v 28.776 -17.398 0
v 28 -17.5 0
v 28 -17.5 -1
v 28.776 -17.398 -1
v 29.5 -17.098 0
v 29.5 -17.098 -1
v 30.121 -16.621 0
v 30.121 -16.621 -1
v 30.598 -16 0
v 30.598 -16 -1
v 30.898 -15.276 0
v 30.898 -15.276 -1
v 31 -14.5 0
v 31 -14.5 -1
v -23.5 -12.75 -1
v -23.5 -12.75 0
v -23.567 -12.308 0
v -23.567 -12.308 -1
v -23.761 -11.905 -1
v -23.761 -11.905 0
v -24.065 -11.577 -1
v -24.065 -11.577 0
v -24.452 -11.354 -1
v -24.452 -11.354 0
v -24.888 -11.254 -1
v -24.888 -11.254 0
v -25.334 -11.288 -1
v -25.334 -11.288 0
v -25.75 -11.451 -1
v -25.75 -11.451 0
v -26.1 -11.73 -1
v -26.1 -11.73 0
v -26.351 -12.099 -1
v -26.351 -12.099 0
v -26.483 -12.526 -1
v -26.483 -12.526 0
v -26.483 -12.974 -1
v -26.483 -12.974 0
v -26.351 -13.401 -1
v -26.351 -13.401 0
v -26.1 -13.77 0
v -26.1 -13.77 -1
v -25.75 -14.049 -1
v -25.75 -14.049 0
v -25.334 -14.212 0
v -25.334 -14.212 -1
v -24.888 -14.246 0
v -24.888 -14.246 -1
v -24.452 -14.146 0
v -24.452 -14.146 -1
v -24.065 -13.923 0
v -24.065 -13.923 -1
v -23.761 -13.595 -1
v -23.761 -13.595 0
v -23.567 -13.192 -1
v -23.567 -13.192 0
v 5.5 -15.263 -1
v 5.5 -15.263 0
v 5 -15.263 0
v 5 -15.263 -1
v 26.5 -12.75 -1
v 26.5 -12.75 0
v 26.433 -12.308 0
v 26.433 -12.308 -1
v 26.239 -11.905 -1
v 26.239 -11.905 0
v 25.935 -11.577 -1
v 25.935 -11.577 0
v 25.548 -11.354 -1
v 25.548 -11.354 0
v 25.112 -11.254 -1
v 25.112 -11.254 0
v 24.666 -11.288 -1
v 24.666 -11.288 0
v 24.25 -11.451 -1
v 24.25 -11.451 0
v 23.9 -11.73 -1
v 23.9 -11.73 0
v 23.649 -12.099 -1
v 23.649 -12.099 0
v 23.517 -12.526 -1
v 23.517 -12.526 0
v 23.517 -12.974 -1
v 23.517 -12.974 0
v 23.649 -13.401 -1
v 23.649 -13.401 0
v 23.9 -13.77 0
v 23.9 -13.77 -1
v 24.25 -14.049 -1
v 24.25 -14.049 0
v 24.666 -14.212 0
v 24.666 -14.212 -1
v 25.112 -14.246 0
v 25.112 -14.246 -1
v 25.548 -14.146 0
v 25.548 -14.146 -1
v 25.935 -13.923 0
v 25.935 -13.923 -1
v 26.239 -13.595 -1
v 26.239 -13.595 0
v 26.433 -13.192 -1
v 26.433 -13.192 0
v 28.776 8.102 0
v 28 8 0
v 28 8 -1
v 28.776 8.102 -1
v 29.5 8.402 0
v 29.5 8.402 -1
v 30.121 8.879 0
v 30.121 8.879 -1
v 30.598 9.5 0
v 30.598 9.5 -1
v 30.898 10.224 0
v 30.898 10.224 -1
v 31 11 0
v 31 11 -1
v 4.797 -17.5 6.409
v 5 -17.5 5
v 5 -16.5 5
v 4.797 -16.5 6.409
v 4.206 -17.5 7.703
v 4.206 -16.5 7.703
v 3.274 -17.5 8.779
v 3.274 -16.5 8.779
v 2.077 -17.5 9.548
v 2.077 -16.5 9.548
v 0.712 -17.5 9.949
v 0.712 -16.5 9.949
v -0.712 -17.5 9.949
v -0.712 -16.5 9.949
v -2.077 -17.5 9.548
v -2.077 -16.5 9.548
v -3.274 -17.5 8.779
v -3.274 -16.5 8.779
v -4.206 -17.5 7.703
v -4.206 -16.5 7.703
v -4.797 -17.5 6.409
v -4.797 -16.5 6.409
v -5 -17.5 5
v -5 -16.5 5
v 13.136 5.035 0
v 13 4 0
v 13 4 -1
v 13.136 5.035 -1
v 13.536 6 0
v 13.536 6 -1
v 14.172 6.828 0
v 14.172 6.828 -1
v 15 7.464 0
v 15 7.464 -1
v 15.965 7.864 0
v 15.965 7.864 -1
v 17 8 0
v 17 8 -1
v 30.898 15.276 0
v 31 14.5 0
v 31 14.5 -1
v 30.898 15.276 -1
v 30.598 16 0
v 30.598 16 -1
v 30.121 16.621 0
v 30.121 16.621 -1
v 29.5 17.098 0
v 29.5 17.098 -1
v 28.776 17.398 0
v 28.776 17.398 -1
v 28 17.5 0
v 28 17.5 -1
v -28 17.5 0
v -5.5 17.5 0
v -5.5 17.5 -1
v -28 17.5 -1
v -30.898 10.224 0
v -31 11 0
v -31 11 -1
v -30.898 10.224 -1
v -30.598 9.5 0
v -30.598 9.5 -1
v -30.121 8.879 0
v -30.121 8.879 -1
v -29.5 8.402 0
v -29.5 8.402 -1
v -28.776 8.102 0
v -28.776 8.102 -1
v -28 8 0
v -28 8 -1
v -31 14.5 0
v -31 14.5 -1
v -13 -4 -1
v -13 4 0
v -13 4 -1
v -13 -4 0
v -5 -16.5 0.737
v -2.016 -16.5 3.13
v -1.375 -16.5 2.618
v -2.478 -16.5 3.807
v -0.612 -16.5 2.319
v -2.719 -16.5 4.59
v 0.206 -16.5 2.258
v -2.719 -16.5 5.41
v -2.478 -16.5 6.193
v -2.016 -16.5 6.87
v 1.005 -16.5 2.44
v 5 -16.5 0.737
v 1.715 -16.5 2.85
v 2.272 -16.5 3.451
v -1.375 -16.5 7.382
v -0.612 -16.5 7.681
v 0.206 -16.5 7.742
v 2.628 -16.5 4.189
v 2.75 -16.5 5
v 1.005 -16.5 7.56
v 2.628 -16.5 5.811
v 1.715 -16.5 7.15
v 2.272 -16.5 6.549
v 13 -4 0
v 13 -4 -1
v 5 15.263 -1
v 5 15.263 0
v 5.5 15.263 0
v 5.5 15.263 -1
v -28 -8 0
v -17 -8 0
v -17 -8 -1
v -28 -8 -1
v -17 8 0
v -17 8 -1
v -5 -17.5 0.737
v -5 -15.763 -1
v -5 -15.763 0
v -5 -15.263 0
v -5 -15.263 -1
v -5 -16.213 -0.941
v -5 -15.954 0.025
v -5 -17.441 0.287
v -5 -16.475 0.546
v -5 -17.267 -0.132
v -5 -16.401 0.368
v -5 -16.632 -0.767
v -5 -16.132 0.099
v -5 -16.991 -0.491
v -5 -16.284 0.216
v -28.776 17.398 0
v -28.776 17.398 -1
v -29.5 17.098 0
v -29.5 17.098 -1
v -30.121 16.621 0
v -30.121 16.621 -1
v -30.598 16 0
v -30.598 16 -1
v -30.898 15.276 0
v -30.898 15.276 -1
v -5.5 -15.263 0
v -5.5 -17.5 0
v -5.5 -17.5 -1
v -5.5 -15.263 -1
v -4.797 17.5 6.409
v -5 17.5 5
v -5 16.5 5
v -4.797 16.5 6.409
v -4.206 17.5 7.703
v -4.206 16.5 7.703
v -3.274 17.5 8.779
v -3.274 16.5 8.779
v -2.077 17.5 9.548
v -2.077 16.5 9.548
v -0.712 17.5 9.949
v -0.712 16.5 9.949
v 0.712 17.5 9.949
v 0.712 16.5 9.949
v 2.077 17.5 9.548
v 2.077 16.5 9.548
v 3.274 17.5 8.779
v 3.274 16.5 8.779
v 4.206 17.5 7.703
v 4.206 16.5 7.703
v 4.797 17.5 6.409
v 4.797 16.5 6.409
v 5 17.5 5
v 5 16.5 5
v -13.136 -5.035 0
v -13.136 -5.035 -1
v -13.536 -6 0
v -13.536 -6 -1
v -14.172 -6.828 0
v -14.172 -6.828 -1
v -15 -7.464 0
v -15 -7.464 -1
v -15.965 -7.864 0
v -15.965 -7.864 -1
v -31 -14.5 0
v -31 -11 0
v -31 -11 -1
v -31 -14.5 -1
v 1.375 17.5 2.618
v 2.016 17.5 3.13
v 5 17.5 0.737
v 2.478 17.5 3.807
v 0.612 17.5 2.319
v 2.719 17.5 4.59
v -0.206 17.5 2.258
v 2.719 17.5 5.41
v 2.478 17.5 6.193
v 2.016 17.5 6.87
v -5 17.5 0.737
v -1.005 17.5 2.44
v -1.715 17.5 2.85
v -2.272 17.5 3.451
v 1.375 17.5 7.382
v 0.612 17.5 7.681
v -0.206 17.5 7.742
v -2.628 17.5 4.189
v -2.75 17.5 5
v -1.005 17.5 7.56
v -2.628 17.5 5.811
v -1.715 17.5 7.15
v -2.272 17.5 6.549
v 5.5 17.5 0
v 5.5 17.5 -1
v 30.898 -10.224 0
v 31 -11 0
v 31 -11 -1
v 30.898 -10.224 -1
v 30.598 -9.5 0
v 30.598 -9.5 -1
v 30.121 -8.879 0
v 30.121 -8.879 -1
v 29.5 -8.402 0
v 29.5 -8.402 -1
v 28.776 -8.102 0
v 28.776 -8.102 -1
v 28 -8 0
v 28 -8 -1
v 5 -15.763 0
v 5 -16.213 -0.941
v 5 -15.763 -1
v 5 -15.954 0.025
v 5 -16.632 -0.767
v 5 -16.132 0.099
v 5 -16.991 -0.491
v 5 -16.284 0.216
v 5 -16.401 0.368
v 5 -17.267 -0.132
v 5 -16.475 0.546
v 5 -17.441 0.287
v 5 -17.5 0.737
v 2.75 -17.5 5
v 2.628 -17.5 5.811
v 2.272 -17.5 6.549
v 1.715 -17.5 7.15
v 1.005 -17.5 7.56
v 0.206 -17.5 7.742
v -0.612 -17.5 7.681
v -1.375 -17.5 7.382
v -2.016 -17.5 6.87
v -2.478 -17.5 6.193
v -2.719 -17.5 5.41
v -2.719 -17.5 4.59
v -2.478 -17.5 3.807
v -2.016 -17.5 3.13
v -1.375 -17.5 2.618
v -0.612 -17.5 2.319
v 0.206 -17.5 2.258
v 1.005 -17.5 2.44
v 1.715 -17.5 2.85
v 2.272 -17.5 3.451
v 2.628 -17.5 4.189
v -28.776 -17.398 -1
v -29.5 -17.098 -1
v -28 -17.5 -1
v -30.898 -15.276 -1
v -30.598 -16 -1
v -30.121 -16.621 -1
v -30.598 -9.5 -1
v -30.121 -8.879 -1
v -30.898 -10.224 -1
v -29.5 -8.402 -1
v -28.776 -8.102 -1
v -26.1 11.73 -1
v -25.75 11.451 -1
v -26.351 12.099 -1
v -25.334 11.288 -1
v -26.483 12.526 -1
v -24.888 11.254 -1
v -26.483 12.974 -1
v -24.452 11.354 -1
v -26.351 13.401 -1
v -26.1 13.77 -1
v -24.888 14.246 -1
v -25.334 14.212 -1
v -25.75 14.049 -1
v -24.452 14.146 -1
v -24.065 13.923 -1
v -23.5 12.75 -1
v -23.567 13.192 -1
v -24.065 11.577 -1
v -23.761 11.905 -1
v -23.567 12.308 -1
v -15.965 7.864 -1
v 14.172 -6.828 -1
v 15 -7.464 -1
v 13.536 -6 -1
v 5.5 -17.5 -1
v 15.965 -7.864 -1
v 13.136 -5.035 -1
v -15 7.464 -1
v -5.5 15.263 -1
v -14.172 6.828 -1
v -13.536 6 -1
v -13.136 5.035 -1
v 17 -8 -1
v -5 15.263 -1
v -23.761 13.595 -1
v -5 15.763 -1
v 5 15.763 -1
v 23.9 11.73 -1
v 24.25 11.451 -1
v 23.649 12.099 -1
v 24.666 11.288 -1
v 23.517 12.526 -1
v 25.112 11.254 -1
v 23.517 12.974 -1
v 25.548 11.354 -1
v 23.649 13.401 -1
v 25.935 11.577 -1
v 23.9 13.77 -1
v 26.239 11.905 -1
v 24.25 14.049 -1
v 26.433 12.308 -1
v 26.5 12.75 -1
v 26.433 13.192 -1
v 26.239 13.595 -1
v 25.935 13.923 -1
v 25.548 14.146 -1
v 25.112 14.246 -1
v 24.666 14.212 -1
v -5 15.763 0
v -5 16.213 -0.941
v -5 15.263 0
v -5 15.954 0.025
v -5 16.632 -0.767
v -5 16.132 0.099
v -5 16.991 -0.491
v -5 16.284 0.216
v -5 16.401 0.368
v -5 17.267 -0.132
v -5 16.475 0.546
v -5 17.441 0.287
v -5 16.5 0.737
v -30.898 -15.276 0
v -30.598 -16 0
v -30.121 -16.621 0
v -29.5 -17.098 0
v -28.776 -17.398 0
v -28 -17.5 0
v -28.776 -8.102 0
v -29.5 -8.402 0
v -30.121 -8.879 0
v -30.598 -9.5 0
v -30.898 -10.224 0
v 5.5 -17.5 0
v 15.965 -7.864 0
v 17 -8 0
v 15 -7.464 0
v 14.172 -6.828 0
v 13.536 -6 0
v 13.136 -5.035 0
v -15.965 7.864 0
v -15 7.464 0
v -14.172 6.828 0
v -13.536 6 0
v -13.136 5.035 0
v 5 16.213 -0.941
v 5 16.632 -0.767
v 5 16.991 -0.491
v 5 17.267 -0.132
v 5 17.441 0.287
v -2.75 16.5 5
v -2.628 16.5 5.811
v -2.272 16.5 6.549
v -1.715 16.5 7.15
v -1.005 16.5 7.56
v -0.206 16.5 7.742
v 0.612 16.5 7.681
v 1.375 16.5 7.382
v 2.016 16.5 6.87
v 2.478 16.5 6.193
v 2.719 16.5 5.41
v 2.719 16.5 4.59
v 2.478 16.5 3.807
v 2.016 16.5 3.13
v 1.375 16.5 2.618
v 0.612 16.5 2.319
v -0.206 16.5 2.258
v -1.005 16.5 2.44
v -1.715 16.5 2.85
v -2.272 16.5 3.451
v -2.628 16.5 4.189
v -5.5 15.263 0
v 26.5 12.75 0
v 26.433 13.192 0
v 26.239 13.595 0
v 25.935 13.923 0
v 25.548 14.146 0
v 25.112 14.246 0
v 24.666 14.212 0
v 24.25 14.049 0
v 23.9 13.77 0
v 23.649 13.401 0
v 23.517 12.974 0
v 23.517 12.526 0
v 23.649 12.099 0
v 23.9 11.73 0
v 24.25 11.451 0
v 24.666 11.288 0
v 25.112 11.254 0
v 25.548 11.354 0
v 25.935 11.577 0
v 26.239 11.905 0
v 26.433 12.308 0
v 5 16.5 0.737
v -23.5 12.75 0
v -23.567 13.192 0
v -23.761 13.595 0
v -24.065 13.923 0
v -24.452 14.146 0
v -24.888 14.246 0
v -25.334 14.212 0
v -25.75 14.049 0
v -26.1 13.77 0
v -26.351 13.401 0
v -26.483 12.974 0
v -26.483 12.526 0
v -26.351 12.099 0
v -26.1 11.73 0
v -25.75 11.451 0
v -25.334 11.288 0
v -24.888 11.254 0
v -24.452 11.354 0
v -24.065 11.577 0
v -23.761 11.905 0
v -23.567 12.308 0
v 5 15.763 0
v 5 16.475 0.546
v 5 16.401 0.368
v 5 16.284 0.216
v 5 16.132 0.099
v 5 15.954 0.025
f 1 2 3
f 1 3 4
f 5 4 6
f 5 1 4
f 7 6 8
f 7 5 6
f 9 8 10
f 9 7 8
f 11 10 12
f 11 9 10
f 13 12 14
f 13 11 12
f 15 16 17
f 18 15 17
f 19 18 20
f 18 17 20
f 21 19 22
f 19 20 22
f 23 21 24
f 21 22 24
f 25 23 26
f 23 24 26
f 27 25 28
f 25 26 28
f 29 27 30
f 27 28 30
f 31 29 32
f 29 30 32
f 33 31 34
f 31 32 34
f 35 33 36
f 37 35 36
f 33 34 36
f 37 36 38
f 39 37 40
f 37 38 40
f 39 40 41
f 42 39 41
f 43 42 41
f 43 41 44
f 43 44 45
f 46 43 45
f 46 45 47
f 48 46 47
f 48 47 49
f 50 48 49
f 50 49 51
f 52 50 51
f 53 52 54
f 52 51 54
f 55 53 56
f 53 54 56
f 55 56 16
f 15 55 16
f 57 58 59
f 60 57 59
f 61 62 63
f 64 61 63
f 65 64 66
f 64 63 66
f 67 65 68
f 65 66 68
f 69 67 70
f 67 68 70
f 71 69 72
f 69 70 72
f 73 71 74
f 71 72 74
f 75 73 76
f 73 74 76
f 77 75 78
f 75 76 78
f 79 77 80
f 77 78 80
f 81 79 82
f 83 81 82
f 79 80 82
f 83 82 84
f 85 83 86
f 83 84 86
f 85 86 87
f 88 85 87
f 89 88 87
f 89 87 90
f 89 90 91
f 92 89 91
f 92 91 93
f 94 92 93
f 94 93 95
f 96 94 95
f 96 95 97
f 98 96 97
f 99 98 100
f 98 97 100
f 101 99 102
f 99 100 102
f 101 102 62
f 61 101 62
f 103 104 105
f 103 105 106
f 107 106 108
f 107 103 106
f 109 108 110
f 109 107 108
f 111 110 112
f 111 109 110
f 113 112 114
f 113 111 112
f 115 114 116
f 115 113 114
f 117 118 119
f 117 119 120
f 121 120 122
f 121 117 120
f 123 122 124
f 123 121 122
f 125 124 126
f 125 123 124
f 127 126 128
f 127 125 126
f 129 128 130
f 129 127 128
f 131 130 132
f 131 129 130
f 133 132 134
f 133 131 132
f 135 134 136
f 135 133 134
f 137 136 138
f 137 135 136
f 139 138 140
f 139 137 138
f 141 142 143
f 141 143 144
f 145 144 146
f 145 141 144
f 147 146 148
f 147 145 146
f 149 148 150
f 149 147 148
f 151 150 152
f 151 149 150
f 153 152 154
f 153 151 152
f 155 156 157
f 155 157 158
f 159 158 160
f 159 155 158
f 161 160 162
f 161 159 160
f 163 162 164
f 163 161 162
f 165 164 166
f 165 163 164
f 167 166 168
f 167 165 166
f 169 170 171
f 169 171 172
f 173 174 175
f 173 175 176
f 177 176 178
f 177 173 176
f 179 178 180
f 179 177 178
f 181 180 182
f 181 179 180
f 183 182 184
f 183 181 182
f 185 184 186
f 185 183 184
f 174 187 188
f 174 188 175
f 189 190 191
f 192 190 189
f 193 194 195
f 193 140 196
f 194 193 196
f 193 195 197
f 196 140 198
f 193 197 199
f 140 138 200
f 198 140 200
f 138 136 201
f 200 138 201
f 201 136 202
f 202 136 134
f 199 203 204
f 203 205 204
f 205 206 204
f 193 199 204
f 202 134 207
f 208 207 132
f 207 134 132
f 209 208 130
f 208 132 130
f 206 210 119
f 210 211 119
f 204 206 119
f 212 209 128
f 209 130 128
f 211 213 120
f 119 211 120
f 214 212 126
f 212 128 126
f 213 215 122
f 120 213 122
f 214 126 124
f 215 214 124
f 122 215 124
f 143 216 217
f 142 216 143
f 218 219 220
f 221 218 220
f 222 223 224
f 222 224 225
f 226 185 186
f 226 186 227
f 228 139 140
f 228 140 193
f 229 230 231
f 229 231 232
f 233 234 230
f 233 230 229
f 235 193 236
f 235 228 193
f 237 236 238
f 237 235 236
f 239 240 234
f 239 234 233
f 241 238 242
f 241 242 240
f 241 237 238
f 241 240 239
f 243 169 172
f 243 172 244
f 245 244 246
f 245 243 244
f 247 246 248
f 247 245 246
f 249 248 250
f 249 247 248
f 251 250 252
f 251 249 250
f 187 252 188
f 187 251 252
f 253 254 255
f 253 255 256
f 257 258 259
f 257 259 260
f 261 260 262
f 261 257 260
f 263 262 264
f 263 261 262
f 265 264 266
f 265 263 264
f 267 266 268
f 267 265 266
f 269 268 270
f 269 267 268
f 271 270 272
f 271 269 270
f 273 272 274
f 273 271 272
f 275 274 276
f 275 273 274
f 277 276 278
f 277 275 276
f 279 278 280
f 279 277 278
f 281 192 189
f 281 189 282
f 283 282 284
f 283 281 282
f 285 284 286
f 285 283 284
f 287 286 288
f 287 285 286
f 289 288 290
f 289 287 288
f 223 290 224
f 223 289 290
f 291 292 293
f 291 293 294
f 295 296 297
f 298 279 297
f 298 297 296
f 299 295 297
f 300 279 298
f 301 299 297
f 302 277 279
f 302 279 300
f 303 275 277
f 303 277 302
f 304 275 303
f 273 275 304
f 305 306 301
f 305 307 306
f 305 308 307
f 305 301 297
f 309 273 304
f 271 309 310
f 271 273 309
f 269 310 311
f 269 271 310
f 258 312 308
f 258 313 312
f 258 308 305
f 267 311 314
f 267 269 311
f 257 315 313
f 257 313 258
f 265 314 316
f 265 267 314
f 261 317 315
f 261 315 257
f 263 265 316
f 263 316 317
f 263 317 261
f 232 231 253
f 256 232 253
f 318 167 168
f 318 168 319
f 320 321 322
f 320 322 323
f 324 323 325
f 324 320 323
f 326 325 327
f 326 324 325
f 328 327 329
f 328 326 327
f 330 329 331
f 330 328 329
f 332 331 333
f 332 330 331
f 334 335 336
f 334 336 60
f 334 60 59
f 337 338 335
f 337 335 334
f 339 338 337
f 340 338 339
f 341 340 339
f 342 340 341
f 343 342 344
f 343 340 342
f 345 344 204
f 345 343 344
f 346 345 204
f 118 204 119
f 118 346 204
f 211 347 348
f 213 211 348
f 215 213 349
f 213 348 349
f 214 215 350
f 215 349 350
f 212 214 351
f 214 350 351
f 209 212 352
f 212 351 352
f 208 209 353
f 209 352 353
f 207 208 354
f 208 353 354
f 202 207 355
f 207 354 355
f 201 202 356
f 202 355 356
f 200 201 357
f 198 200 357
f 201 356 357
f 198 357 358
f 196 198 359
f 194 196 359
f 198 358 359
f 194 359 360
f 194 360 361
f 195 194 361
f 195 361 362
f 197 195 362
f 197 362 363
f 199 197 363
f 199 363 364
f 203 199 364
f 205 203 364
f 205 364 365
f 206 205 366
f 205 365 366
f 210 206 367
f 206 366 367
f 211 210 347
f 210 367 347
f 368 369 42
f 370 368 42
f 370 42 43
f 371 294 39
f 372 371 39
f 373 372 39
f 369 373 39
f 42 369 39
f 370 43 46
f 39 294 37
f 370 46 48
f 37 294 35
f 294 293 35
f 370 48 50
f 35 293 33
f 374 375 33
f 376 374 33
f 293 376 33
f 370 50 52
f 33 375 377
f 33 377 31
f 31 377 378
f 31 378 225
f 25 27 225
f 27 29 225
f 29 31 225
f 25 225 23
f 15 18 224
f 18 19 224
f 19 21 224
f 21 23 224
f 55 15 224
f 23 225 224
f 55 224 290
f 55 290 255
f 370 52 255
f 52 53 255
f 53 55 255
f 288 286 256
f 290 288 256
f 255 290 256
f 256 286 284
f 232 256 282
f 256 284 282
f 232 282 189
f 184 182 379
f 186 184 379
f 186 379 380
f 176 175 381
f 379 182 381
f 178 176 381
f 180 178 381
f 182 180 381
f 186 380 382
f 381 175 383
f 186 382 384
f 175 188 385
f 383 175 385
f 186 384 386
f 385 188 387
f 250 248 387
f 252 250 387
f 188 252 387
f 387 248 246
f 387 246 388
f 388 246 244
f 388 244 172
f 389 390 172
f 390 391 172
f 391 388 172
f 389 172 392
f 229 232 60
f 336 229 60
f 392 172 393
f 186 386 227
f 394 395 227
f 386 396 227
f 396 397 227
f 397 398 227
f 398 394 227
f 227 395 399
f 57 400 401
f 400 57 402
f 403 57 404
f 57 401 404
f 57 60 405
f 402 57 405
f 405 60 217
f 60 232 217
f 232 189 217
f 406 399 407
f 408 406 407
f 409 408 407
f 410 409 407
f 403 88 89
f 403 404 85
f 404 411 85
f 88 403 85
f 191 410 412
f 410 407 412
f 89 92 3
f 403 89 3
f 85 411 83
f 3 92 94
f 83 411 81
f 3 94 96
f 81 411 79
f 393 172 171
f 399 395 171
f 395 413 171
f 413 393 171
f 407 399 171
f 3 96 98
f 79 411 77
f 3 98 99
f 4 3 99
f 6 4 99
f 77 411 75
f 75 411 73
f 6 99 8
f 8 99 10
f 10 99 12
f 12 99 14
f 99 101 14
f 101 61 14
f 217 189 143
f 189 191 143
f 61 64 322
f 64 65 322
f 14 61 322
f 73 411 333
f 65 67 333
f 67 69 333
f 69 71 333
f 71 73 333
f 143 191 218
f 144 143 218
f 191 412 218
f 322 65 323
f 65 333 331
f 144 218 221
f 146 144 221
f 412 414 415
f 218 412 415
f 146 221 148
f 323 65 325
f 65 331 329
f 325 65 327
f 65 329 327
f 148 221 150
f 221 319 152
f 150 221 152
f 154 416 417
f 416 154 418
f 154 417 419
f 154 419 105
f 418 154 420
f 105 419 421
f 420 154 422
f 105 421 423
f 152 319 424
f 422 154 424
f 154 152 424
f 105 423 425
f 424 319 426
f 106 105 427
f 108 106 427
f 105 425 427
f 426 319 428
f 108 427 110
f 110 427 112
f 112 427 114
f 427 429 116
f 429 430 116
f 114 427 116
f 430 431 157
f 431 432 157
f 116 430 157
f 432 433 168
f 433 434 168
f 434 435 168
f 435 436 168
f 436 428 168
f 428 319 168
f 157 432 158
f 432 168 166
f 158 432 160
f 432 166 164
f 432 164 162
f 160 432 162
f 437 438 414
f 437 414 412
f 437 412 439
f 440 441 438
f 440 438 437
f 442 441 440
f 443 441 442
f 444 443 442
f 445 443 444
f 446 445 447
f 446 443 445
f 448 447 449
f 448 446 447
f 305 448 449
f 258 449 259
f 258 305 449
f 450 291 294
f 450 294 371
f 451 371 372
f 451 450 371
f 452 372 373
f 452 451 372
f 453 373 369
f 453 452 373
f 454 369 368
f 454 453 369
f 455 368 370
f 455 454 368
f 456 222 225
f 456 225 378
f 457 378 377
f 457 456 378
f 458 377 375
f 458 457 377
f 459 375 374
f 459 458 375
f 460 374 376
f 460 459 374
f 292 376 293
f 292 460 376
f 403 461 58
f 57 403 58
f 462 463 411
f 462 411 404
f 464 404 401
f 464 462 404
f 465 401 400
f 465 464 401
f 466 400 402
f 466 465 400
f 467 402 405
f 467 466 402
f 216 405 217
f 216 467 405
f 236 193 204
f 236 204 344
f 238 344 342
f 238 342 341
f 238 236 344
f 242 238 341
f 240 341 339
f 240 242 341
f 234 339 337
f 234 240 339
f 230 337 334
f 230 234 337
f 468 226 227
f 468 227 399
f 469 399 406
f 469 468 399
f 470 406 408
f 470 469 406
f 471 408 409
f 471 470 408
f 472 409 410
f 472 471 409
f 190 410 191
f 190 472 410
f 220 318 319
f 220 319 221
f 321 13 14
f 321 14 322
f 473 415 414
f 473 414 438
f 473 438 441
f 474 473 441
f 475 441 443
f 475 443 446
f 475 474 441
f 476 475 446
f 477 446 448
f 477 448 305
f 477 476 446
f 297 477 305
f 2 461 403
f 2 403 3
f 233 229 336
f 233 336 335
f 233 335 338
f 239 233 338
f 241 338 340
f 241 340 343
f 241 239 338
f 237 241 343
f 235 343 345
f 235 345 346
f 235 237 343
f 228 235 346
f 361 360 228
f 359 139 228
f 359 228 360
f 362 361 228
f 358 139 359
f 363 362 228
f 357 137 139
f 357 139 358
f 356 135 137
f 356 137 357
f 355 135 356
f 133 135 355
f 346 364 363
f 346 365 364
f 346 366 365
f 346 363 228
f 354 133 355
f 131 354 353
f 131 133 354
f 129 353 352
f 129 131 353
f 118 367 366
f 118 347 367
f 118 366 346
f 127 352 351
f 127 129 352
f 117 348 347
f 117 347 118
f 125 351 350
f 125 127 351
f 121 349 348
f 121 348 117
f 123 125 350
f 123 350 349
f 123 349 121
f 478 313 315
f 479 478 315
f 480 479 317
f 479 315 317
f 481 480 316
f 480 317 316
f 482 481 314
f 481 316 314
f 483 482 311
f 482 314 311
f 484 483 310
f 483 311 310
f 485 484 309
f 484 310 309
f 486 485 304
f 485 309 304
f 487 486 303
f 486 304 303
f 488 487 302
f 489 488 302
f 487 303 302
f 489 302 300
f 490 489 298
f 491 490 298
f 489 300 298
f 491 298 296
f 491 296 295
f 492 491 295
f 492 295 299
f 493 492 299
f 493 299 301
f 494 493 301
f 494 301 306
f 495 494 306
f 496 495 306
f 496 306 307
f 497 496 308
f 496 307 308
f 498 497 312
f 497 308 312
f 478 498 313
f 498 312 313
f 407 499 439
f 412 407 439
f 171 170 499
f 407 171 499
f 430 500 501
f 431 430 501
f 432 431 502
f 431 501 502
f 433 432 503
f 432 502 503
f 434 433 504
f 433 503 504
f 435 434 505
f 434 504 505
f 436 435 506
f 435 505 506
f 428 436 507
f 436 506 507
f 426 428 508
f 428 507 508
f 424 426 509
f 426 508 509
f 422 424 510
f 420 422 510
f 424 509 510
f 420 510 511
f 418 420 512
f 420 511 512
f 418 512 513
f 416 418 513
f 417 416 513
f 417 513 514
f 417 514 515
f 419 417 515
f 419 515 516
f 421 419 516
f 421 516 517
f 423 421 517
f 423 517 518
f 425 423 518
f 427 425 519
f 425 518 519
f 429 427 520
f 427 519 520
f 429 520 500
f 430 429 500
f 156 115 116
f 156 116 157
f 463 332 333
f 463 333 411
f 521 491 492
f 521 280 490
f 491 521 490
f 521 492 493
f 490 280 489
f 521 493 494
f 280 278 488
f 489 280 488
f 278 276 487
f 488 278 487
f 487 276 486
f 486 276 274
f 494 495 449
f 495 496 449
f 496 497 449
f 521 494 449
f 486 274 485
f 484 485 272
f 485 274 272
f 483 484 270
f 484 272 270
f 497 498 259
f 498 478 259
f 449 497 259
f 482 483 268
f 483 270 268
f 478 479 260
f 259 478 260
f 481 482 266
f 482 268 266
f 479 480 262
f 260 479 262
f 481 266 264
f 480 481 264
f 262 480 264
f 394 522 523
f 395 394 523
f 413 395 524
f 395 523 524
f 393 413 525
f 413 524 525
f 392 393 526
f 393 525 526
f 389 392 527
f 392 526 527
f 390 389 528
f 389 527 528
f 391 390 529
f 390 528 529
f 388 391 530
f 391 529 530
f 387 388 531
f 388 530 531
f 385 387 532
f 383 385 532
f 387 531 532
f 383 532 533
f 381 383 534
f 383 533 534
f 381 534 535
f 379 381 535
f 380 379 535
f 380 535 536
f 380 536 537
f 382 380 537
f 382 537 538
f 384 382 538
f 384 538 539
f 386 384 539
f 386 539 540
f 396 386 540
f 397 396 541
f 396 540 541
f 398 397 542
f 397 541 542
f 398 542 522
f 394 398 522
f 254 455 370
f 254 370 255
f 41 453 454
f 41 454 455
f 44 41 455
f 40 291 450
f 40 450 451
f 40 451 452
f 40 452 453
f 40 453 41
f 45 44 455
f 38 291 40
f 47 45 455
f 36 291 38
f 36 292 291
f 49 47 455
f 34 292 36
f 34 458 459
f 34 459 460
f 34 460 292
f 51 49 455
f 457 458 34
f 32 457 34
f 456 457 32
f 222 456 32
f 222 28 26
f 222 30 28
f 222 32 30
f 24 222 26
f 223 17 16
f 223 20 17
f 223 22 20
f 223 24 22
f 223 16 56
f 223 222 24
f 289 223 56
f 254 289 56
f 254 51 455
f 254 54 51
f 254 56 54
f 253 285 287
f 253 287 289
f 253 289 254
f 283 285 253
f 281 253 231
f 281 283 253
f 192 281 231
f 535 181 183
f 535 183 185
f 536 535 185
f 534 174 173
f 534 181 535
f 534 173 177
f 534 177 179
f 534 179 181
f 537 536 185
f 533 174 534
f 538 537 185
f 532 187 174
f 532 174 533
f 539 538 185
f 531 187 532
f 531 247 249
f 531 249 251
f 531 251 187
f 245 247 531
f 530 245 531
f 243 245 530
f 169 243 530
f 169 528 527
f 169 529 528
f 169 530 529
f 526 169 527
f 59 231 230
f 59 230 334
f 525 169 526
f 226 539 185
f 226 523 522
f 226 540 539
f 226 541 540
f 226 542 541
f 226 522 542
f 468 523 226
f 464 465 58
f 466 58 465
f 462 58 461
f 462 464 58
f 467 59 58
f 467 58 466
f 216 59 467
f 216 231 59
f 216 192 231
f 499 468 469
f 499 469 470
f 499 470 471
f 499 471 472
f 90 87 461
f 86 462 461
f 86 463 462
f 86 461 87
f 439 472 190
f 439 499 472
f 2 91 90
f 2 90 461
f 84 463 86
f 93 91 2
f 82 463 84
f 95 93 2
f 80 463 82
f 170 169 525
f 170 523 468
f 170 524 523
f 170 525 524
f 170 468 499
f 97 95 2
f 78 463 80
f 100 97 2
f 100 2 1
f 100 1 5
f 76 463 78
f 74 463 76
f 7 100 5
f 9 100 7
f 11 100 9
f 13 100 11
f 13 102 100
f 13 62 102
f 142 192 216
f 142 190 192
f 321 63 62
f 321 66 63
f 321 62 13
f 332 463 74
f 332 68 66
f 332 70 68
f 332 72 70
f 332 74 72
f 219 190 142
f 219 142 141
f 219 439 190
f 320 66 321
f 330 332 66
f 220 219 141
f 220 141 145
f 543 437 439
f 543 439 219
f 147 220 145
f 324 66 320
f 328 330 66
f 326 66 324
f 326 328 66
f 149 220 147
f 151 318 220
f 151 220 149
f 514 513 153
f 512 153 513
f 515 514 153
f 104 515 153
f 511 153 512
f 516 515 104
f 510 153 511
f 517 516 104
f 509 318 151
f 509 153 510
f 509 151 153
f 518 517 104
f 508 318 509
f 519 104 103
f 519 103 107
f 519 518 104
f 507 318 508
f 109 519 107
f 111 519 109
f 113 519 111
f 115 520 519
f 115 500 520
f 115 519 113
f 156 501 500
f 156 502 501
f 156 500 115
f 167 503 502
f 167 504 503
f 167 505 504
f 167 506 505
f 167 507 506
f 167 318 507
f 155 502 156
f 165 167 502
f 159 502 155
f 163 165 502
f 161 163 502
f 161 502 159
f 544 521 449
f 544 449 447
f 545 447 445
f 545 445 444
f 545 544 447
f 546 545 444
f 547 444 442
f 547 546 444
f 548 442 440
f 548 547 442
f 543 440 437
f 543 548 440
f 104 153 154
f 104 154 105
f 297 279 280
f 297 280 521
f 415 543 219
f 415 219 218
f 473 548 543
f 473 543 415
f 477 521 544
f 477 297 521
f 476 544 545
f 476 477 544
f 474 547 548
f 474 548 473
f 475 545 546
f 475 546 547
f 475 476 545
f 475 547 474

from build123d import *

# Parameters (mm, degrees)
SKETCH1_R                     = 1.5
BASE_FLANGE1_DEPTH            = 1
EDGE_FLANGE1_STRIP_W          = 5.4732
EDGE_FLANGE1_STRIP_H          = 1
EDGE_FLANGE1_STRIP_CUT_DEPTH  = 10
EDGE_FLANGE1_RELIEF_W         = 5.9732
EDGE_FLANGE1_RELIEF_H         = 0.5
EDGE_FLANGE1_RELIEF_CUT_DEPTH = 1
EDGE_FLANGE1_DEPTH            = 10
EDGE_FLANGE1_PROFILE_R        = 2.75
EDGE_FLANGE1_FLAT_DEPTH       = 1
EDGE_FLANGE2_STRIP_W          = 5.4732
EDGE_FLANGE2_STRIP_H          = 1
EDGE_FLANGE2_STRIP_CUT_DEPTH  = 10
EDGE_FLANGE2_RELIEF_W         = 5.9732
EDGE_FLANGE2_RELIEF_H         = 0.5
EDGE_FLANGE2_RELIEF_CUT_DEPTH = 1
EDGE_FLANGE2_DEPTH            = 10
EDGE_FLANGE2_PROFILE_R        = 2.75
EDGE_FLANGE2_FLAT_DEPTH       = 1


# Sheet-metal steps are written as plain solids
with BuildPart() as part:
    # Sketch1 → Base-Flange1 (new body)
    with BuildSketch(Plane.XY):
        with BuildLine():
            Line((-28, 8), (-17, 8))
            ThreePointArc((-17, 8), (-14.171572875, 6.828427125), (-13, 4))
            Line((-13, 4), (-13, -4))
            ThreePointArc((-13, -4), (-14.171572875, -6.828427125), (-17, -8))
            Line((-17, -8), (-28, -8))
            ThreePointArc((-28, -8), (-30.121320344, -8.878679656), (-31, -11))
            Line((-31, -11), (-31, -14.5))
            ThreePointArc((-31, -14.5), (-30.121320344, -16.621320344), (-28, -17.5))
            Line((-28, -17.5), (28, -17.5))
            ThreePointArc((28, -17.5), (30.121320344, -16.621320344), (31, -14.5))
            Line((31, -14.5), (31, -11))
            ThreePointArc((31, -11), (30.121320344, -8.878679656), (28, -8))
            Line((28, -8), (17, -8))
            ThreePointArc((17, -8), (14.171572875, -6.828427125), (13, -4))
            Line((13, -4), (13, 4))
            ThreePointArc((13, 4), (14.171572875, 6.828427125), (17, 8))
            Line((17, 8), (28, 8))
            ThreePointArc((28, 8), (30.121320344, 8.878679656), (31, 11))
            Line((31, 11), (31, 14.5))
            ThreePointArc((31, 14.5), (30.121320344, 16.621320344), (28, 17.5))
            Line((28, 17.5), (-28, 17.5))
            ThreePointArc((-28, 17.5), (-30.121320344, 16.621320344), (-31, 14.5))
            Line((-31, 14.5), (-31, 11))
            ThreePointArc((-31, 11), (-30.121320344, 8.878679656), (-28, 8))
        make_face()
        with Locations((-25, 12.75)):
            Circle(SKETCH1_R, mode=Mode.SUBTRACT)
        with Locations((25, 12.75)):
            Circle(SKETCH1_R, mode=Mode.SUBTRACT)
        with Locations((25, -12.75)):
            Circle(SKETCH1_R, mode=Mode.SUBTRACT)
        with Locations((-25, -12.75)):
            Circle(SKETCH1_R, mode=Mode.SUBTRACT)
    extrude(amount=-BASE_FLANGE1_DEPTH)

    # Edge-Flange1 strip (across the edge) → Edge-Flange1 strip cut (cut)
    with BuildSketch(Plane(origin=(5, 17.5, 0), x_dir=(0, -1, 0), z_dir=(-1, 0, 0))):
        with Locations((-1, -0.5)):
            Rectangle(EDGE_FLANGE1_STRIP_W, EDGE_FLANGE1_STRIP_H)
    extrude(amount=EDGE_FLANGE1_STRIP_CUT_DEPTH, mode=Mode.SUBTRACT)

    # Edge-Flange1 relief (on the sheet) → Edge-Flange1 relief cut (cut)
    with BuildSketch(Plane(origin=(5, 15.7634, 0), x_dir=(0, -1, 0), z_dir=(0, 0, 1))):
        with Locations((-2.4866, 0.25)):
            Rectangle(EDGE_FLANGE1_RELIEF_W, EDGE_FLANGE1_RELIEF_H)
        with Locations((-2.4866, -10.25)):
            Rectangle(EDGE_FLANGE1_RELIEF_W, EDGE_FLANGE1_RELIEF_H)
    extrude(amount=-EDGE_FLANGE1_RELIEF_CUT_DEPTH, mode=Mode.SUBTRACT)

    # Edge-Flange1 bend section (across the edge) → Edge-Flange1 (add)
    with BuildSketch(Plane(origin=(5, 17.5, 0), x_dir=(0, -1, 0), z_dir=(-1, 0, 0))):
        with BuildLine():
            Line((0, 0.7366), (1, 0.7366))
            ThreePointArc((1, 0.7366), (1.215745145, 0.215745145), (1.7366, 0))
            Line((1.7366, 0), (1.7366, -1))
            ThreePointArc((1.7366, -1), (0.508638364, -0.491361636), (0, 0.7366))
        make_face()
    extrude(amount=EDGE_FLANGE1_DEPTH)

    # Edge-Flange1 profile (on flange) → Edge-Flange1 flat (add)
    with BuildSketch(Plane(origin=(0, 17.5, 0), x_dir=(-1, 0, 0), z_dir=(0, 1, 0))):
        with BuildLine():
            Line((-5, 5), (-5, 0.7366))
            Line((-5, 0.7366), (5, 0.7366))
            Line((5, 0.7366), (5, 5))
            ThreePointArc((5, 5), (0, 10), (-5, 5))
        make_face()
        with Locations((0, 5)):
            Circle(EDGE_FLANGE1_PROFILE_R, mode=Mode.SUBTRACT)
    extrude(amount=-EDGE_FLANGE1_FLAT_DEPTH)

    # Edge-Flange2 strip (across the edge) → Edge-Flange2 strip cut (cut)
    with BuildSketch(Plane(origin=(-5, -17.5, 0), x_dir=(0, 1, 0), z_dir=(1, 0, 0))):
        with Locations((-1, -0.5)):
            Rectangle(EDGE_FLANGE2_STRIP_W, EDGE_FLANGE2_STRIP_H)
    extrude(amount=EDGE_FLANGE2_STRIP_CUT_DEPTH, mode=Mode.SUBTRACT)

    # Edge-Flange2 relief (on the sheet) → Edge-Flange2 relief cut (cut)
    with BuildSketch(Plane(origin=(-5, -15.7634, 0), x_dir=(0, 1, 0), z_dir=(0, 0, 1))):
        with Locations((-2.4866, 0.25)):
            Rectangle(EDGE_FLANGE2_RELIEF_W, EDGE_FLANGE2_RELIEF_H)
        with Locations((-2.4866, -10.25)):
            Rectangle(EDGE_FLANGE2_RELIEF_W, EDGE_FLANGE2_RELIEF_H)
    extrude(amount=-EDGE_FLANGE2_RELIEF_CUT_DEPTH, mode=Mode.SUBTRACT)

    # Edge-Flange2 bend section (across the edge) → Edge-Flange2 (add)
    with BuildSketch(Plane(origin=(-5, -17.5, 0), x_dir=(0, 1, 0), z_dir=(1, 0, 0))):
        with BuildLine():
            Line((0, 0.7366), (1, 0.7366))
            ThreePointArc((1, 0.7366), (1.215745145, 0.215745145), (1.7366, 0))
            Line((1.7366, 0), (1.7366, -1))
            ThreePointArc((1.7366, -1), (0.508638364, -0.491361636), (0, 0.7366))
        make_face()
    extrude(amount=EDGE_FLANGE2_DEPTH)

    # Edge-Flange2 profile (on flange) → Edge-Flange2 flat (add)
    with BuildSketch(Plane.XZ.offset(17.5)):
        with BuildLine():
            ThreePointArc((5, 5), (0, 10), (-5, 5))
            Line((-5, 5), (-5, 0.7366))
            Line((-5, 0.7366), (5, 0.7366))
            Line((5, 0.7366), (5, 5))
        make_face()
        with Locations((0, 5)):
            Circle(EDGE_FLANGE2_PROFILE_R, mode=Mode.SUBTRACT)
    extrude(amount=-EDGE_FLANGE2_FLAT_DEPTH)


solid = part.part
